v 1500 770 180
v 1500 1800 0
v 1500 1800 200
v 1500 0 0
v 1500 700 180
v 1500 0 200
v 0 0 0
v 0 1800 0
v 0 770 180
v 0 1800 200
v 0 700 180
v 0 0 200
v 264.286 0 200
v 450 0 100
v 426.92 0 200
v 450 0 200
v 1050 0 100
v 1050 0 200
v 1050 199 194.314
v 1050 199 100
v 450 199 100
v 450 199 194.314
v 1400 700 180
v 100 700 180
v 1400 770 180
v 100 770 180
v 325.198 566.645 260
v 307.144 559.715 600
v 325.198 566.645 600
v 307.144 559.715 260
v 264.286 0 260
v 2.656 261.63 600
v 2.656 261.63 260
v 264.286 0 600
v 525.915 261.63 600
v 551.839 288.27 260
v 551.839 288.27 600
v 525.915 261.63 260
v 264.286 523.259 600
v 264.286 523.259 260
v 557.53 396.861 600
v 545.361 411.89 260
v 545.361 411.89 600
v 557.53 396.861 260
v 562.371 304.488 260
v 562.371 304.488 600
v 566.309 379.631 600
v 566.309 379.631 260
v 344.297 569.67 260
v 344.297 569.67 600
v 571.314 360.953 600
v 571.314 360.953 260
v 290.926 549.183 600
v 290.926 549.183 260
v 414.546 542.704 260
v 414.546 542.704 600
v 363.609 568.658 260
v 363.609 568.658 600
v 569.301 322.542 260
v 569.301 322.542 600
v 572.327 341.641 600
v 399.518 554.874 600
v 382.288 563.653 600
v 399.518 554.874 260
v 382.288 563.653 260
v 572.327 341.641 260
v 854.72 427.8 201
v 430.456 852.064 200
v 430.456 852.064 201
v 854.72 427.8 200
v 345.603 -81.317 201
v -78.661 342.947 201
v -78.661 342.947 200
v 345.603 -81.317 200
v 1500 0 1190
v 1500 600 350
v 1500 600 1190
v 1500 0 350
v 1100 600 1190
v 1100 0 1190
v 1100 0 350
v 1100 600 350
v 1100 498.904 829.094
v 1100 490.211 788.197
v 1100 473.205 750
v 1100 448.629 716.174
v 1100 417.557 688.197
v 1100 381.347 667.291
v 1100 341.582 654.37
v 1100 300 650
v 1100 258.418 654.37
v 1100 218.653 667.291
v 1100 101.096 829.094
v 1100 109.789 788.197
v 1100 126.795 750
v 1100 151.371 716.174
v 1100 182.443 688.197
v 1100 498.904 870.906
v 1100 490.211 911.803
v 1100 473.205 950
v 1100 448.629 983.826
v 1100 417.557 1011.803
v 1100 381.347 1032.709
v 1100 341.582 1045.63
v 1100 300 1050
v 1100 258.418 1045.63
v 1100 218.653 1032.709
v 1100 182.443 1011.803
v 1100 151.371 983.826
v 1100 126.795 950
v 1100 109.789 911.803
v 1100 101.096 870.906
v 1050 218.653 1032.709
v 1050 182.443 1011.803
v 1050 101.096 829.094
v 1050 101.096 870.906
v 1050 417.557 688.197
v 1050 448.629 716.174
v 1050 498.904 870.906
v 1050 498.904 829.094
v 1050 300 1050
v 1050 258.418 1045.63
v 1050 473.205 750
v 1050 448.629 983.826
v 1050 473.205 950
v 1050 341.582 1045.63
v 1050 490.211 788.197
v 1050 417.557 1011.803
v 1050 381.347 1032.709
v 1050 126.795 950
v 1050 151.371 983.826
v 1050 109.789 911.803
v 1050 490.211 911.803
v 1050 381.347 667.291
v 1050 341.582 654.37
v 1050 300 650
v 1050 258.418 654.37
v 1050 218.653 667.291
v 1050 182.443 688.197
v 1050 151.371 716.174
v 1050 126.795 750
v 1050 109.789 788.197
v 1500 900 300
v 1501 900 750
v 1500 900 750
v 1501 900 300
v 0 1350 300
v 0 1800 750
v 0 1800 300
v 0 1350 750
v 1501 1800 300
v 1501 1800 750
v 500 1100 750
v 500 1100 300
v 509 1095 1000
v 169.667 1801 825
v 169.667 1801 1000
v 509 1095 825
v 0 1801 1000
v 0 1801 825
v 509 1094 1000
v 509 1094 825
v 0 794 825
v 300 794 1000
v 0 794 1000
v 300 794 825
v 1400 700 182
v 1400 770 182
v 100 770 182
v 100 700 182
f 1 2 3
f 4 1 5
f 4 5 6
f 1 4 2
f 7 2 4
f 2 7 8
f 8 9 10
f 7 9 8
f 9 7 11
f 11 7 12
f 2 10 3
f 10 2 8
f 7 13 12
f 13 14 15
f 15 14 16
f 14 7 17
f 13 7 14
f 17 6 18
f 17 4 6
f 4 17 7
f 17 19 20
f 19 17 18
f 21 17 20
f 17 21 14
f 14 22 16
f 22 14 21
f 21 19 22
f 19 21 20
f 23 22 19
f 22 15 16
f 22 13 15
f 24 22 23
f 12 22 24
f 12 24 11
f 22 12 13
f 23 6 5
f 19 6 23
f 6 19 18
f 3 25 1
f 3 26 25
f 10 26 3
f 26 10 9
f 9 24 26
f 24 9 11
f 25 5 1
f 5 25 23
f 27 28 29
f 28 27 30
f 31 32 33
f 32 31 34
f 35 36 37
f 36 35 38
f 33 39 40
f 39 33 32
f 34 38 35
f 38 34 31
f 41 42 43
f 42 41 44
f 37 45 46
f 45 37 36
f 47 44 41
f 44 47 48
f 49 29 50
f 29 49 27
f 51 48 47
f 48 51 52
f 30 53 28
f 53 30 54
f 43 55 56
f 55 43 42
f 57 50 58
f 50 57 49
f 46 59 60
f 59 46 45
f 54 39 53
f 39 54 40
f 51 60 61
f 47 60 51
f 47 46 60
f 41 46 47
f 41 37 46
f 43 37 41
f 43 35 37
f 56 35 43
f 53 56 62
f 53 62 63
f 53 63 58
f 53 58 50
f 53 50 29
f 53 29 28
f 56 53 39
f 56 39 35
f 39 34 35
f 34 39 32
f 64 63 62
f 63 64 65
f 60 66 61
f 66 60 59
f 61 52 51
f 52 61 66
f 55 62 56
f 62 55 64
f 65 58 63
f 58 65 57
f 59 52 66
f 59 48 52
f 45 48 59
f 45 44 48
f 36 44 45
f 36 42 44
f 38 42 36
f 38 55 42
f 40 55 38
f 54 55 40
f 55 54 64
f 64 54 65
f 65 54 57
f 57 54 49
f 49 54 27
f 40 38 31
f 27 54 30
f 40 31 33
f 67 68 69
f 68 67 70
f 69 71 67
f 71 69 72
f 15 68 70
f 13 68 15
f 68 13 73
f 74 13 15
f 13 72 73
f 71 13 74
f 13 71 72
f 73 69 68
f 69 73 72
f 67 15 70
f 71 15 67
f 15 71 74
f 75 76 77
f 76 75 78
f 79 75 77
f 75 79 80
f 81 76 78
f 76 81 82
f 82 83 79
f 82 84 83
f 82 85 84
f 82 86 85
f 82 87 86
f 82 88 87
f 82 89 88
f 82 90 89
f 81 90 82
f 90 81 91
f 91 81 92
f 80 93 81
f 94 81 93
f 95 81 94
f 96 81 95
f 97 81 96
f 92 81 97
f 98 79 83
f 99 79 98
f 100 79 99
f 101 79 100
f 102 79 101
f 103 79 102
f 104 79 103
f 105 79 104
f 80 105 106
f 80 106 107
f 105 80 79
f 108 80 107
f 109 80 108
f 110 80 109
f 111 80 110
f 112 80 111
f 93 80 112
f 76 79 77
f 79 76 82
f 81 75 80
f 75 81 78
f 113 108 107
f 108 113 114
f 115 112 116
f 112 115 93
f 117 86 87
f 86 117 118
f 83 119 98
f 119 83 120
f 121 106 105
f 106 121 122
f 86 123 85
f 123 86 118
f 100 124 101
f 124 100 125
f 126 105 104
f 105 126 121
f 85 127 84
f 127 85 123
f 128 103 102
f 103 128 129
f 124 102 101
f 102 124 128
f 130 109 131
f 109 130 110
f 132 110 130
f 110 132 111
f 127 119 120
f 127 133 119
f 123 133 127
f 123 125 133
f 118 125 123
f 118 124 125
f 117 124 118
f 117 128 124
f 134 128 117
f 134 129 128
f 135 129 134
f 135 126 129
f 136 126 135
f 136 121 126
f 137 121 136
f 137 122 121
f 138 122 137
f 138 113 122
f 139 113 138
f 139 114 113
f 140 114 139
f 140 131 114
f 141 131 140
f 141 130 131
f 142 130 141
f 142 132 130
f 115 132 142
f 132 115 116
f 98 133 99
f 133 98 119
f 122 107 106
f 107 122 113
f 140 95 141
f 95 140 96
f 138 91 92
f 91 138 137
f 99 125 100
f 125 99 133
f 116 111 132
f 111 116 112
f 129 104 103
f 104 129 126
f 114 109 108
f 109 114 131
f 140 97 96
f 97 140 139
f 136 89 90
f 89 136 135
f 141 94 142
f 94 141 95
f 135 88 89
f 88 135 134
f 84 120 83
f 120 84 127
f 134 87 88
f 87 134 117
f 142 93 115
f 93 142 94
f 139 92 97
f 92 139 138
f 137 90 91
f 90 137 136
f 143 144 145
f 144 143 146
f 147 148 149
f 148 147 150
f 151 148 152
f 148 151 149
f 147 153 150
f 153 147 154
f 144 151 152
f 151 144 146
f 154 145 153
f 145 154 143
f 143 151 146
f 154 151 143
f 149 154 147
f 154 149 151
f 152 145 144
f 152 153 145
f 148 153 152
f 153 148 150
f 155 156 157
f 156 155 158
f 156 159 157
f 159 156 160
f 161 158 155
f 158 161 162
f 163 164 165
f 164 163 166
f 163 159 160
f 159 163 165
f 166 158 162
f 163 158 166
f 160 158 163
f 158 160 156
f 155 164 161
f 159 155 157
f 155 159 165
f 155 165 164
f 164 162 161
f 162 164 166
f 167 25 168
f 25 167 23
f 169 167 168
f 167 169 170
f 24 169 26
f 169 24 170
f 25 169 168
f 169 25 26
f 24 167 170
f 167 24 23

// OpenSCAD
L=1800;
W=1500;
H=2450;



%cube([1,L,H]);
%translate([0,L,0])cube([W,1,H]);


level=150;

color([0.5,0.5,0.5]) difference(){
    cube([W,L,200]);
    translate([450,-1,100])cube([600,200,101]);
    
    hull(){
        translate([0,0,200]) cube([W,L,200]);
        translate([-10,700,200-20])cube([1600,70,10]);
    }
}

translate([100,700,200-28])color([0.2,0.3,0.5])cube([1300,70,10]);

translate([0,0,200]){
    translate([0,L-900,100]) tube();
    translate([0,L-1006,800-175]) sink();
    translate([370/1.4,370*(0), 0]) rotate([0,0,45]) wc();
    
    translate([W-400,0,level]) washer();
}
//%translate([0,0,level-25]) cube([370+350,1000,25]);

%difference(){
    translate([0,-100,0])cube([W,100,H]);
    translate([450,-110,0]) cube([600,150,2000]);
}

module washer(){
    cube([400,600,840]);
    translate([0,300,500]) rotate([0,-90,0]) cylinder(h=50,r=200);
}


// https://i.sdvk.ru/i/Art-Max/RIMINI-AM204CHR-CHasha-unitaza-podvesnogo-bezobodkovogo-234851/356502.jpg
module wc(){
    
    translate([0,0,60])hull(){
        cube([370,370,340]);
        for(i=[-1,1]) translate([490-370/4,i*(370/4)+370/2]) 
            cylinder(h=340,r=370/4);
    }
    
    translate([0,-300+370/2,0]) cube([370+350,600,1]);
}

module tube(){
    w=[450,700,900];
    x=[0,500,1500];
    hull(){
        for(i=[0:2]) translate([x[i],900-w[i],0]) cube([1,w[i],450]);
    }
}

module sink(){
    w=[300,509,509/3];
    x=[0,300,1006];
    color([1,1,1,0.4])
    hull(){
        for(i=[0:2]) translate([0,x[i],0]) cube([w[i],1,175]);
    }
}
